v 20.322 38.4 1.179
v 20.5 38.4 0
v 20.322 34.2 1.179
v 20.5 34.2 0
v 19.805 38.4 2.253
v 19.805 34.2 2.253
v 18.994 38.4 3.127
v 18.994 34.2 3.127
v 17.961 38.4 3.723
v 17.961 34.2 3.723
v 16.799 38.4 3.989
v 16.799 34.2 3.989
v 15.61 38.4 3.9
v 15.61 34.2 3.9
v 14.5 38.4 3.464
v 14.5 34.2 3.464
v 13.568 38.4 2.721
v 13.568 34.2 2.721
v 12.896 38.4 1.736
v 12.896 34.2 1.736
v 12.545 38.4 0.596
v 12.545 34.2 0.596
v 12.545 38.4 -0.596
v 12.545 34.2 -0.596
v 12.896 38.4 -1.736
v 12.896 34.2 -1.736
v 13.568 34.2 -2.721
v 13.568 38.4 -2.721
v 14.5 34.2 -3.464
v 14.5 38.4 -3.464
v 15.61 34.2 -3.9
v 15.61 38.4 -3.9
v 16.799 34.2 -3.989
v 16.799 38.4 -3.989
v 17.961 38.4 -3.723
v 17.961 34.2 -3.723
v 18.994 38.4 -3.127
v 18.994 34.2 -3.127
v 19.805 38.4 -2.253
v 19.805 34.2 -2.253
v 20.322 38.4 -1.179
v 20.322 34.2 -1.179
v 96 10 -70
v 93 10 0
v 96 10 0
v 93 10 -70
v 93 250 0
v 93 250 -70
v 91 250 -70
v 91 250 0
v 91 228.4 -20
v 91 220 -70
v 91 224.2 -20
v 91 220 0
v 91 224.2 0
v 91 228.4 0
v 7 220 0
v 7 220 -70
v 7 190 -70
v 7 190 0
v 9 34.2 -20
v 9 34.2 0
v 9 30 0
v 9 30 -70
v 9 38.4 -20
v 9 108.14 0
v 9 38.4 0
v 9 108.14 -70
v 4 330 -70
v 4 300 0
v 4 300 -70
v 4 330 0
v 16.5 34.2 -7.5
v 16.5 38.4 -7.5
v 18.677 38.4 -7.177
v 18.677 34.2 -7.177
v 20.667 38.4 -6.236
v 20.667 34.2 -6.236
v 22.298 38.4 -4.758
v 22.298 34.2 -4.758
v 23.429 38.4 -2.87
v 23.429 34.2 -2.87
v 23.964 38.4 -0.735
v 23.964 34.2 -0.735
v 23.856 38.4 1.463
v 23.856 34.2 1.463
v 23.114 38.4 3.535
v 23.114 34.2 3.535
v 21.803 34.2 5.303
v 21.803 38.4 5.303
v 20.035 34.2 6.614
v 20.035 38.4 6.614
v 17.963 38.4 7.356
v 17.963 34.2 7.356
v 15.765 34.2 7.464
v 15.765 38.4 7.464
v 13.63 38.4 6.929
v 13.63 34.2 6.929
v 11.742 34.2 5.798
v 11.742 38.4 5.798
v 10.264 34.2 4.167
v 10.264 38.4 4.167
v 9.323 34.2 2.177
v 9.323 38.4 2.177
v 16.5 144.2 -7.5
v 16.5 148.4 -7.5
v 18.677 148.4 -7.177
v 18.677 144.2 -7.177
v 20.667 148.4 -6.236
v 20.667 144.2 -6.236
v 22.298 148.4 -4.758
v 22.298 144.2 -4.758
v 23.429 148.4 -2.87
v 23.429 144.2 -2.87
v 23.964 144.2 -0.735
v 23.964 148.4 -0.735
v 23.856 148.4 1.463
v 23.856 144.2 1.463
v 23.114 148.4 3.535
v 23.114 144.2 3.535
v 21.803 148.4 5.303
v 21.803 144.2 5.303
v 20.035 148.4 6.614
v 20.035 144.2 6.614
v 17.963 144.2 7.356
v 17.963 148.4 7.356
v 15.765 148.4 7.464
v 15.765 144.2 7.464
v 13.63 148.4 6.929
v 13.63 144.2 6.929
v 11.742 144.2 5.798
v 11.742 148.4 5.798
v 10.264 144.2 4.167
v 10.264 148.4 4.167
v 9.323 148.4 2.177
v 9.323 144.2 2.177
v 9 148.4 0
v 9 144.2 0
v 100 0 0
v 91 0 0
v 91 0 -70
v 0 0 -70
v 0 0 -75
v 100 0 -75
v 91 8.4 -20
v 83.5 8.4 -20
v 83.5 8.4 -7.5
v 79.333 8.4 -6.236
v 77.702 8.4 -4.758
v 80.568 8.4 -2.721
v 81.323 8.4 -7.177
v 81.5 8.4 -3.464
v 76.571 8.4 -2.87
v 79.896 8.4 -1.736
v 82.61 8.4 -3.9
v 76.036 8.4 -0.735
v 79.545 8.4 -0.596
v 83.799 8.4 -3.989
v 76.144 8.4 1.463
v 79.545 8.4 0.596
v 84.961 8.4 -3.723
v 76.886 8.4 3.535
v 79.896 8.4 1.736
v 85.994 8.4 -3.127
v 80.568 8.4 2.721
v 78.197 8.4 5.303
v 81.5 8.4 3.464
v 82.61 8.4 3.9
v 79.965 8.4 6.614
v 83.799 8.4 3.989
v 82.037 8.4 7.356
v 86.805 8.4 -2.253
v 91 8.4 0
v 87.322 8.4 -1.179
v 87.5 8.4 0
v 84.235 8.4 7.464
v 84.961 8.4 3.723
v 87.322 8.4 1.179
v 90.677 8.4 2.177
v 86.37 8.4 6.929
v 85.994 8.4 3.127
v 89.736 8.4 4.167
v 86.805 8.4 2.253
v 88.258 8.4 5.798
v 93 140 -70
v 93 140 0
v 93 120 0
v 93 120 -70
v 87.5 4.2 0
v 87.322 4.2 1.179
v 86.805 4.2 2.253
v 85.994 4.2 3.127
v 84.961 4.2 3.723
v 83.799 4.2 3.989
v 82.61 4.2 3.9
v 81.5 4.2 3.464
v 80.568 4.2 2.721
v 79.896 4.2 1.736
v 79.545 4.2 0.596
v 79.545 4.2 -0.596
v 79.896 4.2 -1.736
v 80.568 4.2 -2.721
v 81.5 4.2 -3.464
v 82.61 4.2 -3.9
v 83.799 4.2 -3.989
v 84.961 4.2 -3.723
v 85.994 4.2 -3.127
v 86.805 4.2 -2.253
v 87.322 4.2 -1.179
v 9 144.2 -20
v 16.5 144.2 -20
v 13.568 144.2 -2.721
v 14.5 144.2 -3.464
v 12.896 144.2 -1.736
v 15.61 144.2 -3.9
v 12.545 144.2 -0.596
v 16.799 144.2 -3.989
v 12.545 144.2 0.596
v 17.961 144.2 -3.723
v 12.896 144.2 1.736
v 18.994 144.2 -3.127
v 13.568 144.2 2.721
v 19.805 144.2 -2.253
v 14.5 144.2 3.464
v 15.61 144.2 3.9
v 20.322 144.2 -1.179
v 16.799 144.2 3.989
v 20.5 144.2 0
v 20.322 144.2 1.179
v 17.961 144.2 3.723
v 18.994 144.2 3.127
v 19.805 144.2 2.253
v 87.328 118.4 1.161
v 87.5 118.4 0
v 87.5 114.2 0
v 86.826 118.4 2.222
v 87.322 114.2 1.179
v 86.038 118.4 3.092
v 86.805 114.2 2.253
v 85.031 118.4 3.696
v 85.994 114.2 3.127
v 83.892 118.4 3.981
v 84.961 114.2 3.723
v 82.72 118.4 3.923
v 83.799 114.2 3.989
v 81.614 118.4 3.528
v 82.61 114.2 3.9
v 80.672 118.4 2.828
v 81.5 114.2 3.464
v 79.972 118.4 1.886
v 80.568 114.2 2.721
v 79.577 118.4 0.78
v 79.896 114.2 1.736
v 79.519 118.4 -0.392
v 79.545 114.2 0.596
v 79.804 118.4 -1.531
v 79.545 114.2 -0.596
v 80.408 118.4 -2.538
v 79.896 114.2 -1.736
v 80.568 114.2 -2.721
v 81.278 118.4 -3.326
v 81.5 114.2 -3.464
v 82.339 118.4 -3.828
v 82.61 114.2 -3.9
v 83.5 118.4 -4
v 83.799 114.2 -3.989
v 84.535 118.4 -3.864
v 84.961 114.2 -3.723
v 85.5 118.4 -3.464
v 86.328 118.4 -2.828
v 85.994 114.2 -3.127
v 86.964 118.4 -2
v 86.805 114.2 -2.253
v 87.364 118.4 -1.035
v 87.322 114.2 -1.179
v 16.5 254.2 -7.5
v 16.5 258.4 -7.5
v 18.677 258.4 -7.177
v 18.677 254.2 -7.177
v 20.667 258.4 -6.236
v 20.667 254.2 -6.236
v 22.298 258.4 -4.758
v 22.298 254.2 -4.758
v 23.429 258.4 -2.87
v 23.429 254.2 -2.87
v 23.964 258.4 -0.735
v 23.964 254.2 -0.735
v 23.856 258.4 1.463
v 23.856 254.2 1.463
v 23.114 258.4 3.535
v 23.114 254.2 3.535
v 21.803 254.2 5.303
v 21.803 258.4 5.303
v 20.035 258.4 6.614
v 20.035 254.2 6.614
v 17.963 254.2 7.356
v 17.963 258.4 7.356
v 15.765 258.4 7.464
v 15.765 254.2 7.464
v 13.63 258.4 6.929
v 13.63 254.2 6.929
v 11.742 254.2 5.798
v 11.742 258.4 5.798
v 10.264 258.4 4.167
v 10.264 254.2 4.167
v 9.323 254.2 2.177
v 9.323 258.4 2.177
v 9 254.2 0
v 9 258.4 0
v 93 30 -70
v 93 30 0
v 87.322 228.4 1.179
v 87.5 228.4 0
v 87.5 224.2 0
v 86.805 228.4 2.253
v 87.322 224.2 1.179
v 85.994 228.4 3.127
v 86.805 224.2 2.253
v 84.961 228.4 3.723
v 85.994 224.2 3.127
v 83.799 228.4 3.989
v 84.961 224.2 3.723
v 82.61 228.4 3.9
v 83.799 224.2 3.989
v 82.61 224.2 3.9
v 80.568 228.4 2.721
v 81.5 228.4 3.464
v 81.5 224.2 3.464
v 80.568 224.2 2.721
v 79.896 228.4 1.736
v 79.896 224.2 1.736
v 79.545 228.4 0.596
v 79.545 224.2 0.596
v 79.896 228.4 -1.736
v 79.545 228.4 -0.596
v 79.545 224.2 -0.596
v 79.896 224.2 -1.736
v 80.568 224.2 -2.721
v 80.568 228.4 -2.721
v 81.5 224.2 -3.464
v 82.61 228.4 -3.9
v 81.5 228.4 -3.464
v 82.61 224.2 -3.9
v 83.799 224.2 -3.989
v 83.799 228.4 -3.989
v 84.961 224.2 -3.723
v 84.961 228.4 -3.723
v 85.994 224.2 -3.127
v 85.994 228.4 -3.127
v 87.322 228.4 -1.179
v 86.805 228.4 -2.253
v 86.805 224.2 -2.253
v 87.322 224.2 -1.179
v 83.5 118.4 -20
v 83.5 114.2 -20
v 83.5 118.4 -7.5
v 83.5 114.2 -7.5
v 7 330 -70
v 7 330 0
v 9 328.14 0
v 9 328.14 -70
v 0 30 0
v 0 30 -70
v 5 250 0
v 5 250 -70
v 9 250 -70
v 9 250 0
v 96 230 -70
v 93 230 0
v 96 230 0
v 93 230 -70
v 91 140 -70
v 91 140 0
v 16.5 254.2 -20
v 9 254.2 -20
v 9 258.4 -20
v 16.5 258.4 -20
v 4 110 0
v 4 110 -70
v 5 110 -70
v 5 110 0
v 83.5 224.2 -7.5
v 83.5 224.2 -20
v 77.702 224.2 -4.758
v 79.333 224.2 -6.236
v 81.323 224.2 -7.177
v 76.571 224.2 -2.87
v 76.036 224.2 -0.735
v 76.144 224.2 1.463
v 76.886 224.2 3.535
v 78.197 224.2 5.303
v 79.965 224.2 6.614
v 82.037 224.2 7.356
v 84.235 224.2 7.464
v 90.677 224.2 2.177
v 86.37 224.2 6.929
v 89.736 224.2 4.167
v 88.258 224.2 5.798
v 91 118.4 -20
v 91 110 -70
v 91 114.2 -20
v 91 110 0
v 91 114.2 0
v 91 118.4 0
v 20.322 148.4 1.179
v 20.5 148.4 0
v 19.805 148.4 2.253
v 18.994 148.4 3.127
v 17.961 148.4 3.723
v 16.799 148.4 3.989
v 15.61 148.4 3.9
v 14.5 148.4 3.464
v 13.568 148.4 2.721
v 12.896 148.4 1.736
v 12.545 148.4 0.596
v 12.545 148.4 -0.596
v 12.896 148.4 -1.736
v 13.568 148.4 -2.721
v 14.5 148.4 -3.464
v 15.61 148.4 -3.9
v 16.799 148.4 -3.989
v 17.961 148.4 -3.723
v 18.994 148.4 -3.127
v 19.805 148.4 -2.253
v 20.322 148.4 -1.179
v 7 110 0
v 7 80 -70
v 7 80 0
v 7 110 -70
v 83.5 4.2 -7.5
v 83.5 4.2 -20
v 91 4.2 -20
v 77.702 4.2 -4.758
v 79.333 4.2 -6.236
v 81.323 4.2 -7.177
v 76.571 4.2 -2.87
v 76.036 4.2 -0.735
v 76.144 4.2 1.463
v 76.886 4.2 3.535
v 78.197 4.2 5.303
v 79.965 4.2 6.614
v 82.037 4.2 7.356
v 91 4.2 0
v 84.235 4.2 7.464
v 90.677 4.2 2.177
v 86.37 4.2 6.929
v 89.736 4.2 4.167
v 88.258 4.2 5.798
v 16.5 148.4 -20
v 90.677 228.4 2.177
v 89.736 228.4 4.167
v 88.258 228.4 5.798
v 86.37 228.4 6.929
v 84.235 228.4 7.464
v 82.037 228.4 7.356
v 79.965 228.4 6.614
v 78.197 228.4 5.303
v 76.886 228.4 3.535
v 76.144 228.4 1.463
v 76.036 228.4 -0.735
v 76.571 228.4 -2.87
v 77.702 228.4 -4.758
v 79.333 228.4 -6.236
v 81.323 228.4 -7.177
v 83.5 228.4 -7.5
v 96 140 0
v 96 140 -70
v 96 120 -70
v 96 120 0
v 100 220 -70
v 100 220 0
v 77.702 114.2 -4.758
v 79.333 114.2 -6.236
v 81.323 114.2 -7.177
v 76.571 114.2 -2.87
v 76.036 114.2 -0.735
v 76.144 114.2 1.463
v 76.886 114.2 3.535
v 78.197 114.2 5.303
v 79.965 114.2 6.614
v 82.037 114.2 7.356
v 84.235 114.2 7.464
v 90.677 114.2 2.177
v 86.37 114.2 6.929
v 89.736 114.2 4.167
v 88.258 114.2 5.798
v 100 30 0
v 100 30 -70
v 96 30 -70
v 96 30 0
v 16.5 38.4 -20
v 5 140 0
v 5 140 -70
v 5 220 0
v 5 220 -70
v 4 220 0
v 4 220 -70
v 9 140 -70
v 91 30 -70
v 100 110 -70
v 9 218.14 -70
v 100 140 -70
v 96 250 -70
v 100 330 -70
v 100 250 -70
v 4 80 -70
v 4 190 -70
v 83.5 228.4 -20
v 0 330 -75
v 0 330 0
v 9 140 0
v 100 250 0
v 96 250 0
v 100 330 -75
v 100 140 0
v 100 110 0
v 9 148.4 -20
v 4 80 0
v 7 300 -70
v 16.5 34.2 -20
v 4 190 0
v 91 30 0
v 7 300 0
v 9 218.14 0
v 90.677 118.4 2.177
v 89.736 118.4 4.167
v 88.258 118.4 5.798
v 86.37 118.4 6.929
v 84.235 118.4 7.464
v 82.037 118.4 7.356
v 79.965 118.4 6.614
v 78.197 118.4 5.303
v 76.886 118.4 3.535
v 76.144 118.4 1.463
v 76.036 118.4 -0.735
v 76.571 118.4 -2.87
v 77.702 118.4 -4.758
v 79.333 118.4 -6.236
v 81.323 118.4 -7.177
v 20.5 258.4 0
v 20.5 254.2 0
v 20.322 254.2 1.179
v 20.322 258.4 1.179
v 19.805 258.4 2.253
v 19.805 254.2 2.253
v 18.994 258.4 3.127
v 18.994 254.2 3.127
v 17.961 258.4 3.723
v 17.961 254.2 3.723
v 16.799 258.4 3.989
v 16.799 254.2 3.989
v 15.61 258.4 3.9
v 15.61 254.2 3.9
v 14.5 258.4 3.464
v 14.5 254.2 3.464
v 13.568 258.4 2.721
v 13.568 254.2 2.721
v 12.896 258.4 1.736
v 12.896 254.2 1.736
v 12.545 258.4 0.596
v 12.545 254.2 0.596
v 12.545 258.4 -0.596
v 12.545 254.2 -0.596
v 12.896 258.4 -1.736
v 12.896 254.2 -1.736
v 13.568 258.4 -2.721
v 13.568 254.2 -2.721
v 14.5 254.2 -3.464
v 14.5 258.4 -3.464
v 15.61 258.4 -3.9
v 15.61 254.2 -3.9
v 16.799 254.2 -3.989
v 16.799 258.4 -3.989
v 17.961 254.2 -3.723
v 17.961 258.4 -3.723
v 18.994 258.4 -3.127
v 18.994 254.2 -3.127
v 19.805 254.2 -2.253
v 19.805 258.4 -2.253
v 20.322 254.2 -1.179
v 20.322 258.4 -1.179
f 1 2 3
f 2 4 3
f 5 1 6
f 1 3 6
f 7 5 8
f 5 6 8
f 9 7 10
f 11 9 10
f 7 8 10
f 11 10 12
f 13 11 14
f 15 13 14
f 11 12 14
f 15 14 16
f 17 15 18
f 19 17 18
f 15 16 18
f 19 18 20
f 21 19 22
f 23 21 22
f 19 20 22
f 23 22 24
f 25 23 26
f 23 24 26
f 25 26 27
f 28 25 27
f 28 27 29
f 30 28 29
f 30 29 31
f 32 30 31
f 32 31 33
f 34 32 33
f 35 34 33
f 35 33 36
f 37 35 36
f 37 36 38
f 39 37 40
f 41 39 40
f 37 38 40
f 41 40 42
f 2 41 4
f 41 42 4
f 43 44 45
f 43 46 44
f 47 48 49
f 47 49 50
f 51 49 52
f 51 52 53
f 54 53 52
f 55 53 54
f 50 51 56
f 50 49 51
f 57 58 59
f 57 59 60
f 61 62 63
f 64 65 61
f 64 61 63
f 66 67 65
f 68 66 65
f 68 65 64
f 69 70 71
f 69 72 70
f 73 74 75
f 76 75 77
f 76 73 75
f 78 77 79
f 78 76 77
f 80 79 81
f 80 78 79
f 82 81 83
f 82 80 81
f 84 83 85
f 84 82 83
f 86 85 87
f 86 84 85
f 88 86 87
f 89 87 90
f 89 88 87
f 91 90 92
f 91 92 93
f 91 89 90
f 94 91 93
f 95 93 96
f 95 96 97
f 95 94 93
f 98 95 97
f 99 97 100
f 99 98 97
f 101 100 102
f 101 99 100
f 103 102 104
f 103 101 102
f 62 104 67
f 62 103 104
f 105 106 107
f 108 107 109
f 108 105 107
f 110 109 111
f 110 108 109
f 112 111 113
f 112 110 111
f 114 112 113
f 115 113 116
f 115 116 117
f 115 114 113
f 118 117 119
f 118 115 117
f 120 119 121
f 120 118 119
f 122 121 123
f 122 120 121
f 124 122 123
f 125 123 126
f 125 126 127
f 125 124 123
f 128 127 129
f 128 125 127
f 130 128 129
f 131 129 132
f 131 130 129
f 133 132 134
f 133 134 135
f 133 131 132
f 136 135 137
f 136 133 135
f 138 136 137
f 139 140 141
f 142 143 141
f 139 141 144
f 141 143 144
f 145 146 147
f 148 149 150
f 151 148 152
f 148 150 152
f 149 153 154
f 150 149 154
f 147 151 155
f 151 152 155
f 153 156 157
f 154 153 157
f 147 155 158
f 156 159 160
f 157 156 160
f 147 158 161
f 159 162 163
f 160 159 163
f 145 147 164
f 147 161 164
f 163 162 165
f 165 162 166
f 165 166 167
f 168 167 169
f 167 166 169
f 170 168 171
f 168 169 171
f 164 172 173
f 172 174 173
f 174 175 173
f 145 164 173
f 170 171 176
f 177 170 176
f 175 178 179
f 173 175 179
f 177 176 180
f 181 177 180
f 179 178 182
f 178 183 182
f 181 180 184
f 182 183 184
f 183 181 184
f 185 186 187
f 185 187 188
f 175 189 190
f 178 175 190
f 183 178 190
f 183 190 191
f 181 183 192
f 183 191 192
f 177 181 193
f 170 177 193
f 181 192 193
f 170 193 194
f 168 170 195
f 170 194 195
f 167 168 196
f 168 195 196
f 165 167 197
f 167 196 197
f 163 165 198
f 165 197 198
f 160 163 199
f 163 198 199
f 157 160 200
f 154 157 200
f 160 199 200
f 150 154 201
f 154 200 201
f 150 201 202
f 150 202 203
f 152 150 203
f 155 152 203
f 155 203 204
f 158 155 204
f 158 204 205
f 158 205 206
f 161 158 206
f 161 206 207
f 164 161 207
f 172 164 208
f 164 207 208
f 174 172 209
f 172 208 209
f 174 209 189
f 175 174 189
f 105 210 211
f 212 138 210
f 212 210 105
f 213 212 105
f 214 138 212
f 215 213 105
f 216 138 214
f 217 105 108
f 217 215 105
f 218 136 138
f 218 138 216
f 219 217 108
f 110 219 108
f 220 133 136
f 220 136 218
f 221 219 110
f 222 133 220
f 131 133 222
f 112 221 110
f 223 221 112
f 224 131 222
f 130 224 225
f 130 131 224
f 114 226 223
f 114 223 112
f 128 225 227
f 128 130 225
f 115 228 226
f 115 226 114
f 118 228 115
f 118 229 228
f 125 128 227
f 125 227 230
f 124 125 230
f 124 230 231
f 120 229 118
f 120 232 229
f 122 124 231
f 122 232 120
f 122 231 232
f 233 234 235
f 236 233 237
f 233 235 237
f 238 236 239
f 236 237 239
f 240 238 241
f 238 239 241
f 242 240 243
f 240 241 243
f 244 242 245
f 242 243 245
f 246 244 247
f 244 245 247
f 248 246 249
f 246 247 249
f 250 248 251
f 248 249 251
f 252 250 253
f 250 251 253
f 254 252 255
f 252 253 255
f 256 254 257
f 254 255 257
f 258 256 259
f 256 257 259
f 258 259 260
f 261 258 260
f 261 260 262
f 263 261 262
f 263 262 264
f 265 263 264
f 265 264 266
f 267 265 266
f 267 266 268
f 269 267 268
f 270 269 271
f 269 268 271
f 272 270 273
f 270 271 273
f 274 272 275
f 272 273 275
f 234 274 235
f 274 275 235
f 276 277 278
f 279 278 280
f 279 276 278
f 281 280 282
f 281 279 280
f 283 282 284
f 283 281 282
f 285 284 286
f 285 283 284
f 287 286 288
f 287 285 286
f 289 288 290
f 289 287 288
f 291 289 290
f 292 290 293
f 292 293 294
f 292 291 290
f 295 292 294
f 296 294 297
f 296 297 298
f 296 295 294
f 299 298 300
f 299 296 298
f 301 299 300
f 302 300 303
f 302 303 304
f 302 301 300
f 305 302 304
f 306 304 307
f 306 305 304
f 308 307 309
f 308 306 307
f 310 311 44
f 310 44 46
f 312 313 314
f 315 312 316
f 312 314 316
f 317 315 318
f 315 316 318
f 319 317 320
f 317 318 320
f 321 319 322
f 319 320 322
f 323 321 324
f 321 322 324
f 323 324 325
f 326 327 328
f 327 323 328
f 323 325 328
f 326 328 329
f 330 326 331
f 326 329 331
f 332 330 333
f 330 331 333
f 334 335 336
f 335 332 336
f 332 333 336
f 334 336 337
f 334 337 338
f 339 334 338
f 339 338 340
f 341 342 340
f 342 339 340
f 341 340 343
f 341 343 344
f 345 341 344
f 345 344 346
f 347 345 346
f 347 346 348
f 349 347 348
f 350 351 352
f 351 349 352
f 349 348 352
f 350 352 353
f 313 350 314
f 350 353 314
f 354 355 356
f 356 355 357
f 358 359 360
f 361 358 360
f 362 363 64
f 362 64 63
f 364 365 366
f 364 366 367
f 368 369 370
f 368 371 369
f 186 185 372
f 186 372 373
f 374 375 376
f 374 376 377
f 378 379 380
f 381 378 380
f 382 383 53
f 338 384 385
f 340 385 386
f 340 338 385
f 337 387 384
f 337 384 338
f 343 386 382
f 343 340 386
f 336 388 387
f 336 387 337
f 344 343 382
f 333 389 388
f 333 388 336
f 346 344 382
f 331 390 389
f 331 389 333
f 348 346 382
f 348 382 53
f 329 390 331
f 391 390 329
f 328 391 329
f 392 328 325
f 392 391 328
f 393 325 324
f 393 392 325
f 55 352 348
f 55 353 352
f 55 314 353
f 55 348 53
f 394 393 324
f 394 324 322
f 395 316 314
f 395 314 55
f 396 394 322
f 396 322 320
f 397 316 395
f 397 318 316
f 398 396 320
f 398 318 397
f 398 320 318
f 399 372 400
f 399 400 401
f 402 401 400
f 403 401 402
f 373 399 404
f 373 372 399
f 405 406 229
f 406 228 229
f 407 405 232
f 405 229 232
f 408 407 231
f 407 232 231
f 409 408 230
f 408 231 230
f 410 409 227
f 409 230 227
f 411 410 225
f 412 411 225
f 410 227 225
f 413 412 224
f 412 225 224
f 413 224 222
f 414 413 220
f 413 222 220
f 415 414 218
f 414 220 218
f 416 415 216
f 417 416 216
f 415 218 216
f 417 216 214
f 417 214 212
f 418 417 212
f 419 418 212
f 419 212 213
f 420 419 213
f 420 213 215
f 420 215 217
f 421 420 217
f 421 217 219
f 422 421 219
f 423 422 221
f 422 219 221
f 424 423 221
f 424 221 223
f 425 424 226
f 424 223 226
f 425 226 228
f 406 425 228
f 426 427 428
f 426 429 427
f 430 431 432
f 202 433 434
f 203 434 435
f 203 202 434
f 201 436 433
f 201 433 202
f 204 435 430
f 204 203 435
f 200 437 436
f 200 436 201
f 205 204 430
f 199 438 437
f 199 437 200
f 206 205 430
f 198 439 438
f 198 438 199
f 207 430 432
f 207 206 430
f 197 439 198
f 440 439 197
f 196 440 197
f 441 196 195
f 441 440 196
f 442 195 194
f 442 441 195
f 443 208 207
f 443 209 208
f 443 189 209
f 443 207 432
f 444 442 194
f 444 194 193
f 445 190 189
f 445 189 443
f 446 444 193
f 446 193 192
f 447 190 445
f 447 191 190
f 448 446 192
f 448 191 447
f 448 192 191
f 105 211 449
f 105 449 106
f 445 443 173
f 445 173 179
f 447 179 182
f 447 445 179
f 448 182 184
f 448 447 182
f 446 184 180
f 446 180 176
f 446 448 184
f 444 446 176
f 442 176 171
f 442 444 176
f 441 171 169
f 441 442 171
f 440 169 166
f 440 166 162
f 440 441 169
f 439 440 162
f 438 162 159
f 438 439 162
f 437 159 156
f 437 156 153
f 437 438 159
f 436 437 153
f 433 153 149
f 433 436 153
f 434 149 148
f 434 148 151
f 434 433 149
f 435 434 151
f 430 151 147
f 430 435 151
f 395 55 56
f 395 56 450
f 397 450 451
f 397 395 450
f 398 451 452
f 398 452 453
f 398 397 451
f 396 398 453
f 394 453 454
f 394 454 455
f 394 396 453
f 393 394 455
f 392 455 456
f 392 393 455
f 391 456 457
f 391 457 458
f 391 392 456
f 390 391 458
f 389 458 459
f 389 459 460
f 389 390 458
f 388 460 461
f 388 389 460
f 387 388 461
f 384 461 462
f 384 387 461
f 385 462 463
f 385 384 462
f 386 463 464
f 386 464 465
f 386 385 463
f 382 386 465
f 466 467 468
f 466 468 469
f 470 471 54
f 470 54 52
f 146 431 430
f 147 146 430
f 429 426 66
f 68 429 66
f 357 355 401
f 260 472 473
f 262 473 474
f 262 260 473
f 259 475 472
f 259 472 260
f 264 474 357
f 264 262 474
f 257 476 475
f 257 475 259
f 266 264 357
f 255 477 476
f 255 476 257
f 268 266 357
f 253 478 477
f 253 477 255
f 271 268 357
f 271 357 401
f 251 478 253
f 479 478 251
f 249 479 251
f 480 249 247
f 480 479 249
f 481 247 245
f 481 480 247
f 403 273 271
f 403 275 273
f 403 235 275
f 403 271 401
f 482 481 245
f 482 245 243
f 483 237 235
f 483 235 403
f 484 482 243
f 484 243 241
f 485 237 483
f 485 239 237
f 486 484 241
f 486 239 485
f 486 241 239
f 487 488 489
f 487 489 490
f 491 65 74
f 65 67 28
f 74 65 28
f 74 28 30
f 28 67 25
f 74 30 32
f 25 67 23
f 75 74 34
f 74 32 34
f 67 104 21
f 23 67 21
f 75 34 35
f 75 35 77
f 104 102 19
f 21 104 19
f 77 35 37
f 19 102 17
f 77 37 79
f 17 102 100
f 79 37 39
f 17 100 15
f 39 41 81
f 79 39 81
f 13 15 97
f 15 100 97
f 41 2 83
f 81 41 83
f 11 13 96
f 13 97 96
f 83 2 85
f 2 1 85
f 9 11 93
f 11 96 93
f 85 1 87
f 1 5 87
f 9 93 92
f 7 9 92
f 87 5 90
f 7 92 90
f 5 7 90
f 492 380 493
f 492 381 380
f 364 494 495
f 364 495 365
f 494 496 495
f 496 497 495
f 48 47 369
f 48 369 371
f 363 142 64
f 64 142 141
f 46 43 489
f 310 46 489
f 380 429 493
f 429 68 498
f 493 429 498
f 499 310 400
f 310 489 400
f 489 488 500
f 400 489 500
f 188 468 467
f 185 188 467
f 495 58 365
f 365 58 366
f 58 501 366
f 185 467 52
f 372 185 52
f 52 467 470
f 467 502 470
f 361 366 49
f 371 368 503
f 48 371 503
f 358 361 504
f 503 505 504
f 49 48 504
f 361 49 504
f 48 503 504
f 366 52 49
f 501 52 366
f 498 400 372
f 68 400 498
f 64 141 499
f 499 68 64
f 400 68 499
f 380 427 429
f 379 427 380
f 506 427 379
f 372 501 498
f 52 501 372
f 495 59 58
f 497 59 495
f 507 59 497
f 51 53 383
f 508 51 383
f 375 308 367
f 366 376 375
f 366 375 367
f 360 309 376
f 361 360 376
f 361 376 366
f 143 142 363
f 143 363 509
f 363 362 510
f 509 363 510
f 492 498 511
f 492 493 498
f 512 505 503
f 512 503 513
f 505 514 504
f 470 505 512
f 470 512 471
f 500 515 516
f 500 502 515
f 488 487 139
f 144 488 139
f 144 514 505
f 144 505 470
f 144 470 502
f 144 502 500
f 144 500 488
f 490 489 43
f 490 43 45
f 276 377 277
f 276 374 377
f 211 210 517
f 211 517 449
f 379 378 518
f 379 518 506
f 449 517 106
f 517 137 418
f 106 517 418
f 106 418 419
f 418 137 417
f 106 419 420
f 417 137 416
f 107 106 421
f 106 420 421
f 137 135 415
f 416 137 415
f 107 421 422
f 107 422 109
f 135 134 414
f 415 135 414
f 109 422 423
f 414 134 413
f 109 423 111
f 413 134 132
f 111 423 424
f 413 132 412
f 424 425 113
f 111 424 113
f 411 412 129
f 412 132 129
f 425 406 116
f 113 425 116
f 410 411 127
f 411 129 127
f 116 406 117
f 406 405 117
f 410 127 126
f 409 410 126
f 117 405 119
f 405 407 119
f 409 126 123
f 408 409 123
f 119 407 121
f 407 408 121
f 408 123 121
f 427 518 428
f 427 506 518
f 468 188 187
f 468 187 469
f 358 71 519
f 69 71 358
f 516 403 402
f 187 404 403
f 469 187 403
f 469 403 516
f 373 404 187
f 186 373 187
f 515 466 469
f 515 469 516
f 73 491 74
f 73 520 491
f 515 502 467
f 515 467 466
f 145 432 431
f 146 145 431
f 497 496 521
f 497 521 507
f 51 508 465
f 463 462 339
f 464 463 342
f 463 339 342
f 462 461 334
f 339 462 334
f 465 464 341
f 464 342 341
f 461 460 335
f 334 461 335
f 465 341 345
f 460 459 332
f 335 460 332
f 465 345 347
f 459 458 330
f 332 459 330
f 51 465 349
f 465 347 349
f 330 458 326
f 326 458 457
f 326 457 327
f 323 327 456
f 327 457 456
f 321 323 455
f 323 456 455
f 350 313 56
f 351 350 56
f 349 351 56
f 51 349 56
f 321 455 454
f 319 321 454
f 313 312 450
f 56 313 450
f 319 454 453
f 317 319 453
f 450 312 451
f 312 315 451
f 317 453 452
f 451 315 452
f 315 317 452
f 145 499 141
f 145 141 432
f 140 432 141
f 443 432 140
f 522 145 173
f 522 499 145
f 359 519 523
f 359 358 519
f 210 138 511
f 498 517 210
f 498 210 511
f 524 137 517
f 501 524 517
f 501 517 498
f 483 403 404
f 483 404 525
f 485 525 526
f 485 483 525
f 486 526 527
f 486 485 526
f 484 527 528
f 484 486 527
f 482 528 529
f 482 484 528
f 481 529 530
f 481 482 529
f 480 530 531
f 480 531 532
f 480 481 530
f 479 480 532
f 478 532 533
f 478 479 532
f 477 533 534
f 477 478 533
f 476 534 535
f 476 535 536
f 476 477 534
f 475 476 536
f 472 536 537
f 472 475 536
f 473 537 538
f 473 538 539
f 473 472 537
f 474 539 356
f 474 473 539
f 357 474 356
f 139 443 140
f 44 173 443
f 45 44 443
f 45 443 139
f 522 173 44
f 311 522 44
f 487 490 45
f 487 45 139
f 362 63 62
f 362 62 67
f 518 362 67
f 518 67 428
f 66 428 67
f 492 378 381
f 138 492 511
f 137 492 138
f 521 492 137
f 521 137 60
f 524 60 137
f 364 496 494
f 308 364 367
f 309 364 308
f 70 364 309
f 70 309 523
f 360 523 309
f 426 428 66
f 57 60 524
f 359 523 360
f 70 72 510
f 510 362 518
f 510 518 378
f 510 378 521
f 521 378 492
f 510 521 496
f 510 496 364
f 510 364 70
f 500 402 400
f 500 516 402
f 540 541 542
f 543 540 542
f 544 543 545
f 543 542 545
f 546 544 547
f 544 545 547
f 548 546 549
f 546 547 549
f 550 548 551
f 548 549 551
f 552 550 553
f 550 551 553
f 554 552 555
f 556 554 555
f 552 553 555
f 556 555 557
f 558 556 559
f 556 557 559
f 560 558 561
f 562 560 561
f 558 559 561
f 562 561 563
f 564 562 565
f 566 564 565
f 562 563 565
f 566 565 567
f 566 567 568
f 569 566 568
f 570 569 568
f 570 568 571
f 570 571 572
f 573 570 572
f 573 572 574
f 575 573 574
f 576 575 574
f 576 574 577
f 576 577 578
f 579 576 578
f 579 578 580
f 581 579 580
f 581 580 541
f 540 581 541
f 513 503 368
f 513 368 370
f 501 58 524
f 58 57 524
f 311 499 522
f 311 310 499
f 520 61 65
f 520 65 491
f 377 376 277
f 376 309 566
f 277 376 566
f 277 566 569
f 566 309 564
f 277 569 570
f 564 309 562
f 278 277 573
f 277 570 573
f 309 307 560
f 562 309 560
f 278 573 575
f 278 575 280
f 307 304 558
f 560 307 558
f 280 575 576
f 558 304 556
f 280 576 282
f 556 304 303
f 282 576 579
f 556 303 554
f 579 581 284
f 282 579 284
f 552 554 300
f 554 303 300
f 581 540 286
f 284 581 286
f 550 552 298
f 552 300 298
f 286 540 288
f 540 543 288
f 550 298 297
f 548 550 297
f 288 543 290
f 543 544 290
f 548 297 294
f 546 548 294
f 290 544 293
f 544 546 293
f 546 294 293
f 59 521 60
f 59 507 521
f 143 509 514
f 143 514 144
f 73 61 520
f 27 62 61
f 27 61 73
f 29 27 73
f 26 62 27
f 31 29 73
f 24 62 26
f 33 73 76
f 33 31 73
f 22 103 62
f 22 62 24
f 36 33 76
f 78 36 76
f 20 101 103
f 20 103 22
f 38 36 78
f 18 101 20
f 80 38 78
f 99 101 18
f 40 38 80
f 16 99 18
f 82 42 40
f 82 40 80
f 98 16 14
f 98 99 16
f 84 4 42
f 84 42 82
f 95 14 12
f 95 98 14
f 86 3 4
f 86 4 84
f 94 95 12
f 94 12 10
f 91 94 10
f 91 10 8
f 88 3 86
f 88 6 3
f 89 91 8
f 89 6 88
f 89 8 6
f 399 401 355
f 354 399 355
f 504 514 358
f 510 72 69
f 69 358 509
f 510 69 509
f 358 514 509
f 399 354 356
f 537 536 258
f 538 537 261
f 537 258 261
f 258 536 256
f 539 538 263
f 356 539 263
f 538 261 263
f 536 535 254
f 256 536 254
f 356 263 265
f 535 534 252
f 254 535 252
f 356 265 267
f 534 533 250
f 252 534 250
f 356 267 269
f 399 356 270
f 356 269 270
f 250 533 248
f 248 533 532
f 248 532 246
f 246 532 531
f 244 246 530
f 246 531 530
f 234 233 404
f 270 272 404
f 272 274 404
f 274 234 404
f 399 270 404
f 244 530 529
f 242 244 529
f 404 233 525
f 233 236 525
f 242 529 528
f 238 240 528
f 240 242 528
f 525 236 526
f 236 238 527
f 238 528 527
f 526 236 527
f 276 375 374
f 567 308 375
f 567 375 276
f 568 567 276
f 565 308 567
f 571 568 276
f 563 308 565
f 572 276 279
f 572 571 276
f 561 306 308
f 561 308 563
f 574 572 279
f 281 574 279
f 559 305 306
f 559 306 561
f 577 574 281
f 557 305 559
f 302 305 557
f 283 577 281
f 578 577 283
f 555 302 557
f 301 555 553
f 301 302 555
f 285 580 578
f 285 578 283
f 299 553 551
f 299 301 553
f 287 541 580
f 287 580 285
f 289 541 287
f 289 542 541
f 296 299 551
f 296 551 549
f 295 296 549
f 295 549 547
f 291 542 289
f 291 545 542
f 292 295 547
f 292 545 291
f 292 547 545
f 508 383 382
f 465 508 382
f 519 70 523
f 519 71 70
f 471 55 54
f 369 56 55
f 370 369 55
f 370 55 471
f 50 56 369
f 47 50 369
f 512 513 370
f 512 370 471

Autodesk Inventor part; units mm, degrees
sketch "Boceto1" plane through (0, 0, 0) normal (1, 0, 0) x (0, 1, 0)
  line L0 (0, 0) -> (330, 0)
  line L1 (330, 0) -> (330, -75)
  line L2 (330, -75) -> (0, -75)
  line L3 (0, -75) -> (0, 0)
  dimension "d0" = 330
  dimension "d1" = 75
extrude "Extrusión1" add sketch "Boceto1" along normal blind 5
sketch "Boceto2" plane through (5, 0, 0) normal (1, 0, 0) x (0, 0, -1)
  line L0 (75, 330) -> (0, 330) projected
  line L1 (75, 0) -> (75, 330) projected
  line L2 (0, 330) -> (75, 330)
  line L3 (75, 330) -> (75, 250)
  line L4 (75, 250) -> (0, 250)
  line L5 (0, 250) -> (0, 330)
  line L6 (75, 140) -> (0, 140)
  line L7 (0, 140) -> (0, 220)
  line L8 (0, 220) -> (75, 220)
  line L9 (75, 220) -> (75, 140)
  line L10 (75, 30) -> (0, 30)
  line L11 (0, 30) -> (0, 110)
  line L12 (0, 110) -> (75, 110)
  line L13 (75, 110) -> (75, 30)
  point P0 (0, 0)
  dimension "d4" = 80
  dimension "d7" = 110
extrude "Extrusión2" add sketch "Boceto2" along normal blind 4
sketch "Boceto3" plane through (0, 330, 0) normal (0, 1, 0) x (1, 0, 0)
  line L0 (7, 0) -> (4, 0)
  line L1 (4, 0) -> (4, 75)
  line L2 (4, 75) -> (7, 75)
  line L3 (7, 75) -> (7, 0)
  line L4 (0, 75) -> (0, 0) projected
  line L5 (9, 75) -> (9, 0) projected
  line L6 (0, 0) -> (9, 0) projected
  line L7 (0, 75) -> (9, 75) projected
  dimension "d14" = 4
  dimension "d15" = 2
  dimension "d16" = 0
  dimension "d17" = 0
  dimension "d62" = 3
sketch "Boceto8" plane through (5, 220, 0) normal (0, 1, 0) x (1, 0, 0)
  line L0 (-1, 0) -> (-1, 75) projected
  line L1 (2, 75) -> (2, 0) projected
  line L2 (-5, 0) -> (4, 0) projected
  line L3 (-5, 75) -> (4, 75) projected
sketch "Boceto9" plane through (5, 110, 0) normal (0, 1, 0) x (1, 0, 0)
  line L0 (2, 75) -> (2, 0) projected
  line L1 (-1, 0) -> (-1, 75) projected
  line L2 (-5, 0) -> (4, 0) projected
  line L3 (-5, 75) -> (4, 75) projected
extrude "Extrusión3" cut sketch "Boceto3" against normal blind 30 contours L0 L1 L2 L3
extrude "Extrusión4" cut sketch "Boceto8" against normal blind 30
extrude "Extrusión5" cut sketch "Boceto9" against normal blind 30
sketch "Boceto10" plane through (0, 0, 0) normal (-1, 0, 0) x (0, 0, 1)
  line L0 (-75, 0) -> (-75, 330) projected
  line L1 (-75, 330) -> (0, 330) projected
  line L2 (-75, 0) -> (-70, 0)
  line L3 (-70, 0) -> (-70, 330)
  line L4 (-70, 330) -> (-75, 330)
  line L5 (-75, 330) -> (-75, 0)
  point P0 (0, 0)
  dimension "d24" = 5
extrude "Extrusión6" add sketch "Boceto10" against normal blind 100
sketch "Boceto11" plane through (5, 0, -70) normal (0, 0, 1) x (1, 0, 0)
  line L0 (95, 330) -> (95, 0) projected
  line L1 (-5, 0) -> (95, 0) projected
  line L2 (95, 330) -> (90, 330)
  line L3 (90, 330) -> (90, 0)
  line L4 (90, 0) -> (95, 0)
  line L5 (95, 0) -> (95, 330)
  dimension "d27" = 5
extrude "Extrusión7" add sketch "Boceto11" along normal blind 70
sketch "Boceto12" plane through (95, 0, -70) normal (-1, 0, 0) x (0, 0, 1)
  line L0 (70, 0) -> (70, 330) projected
  line L1 (-5, 0) -> (-5, 330) projected
  line L2 (70, 250) -> (-5, 250)
  line L3 (-5, 250) -> (-5, 220)
  line L4 (-5, 220) -> (70, 220)
  line L5 (70, 220) -> (70, 250)
  line L6 (-5, 330) -> (70, 330) projected
  line L7 (70, 140) -> (-5, 140)
  line L8 (-5, 140) -> (-5, 110)
  line L9 (-5, 110) -> (70, 110)
  line L10 (70, 110) -> (70, 140)
  line L11 (70, 30) -> (-5, 30)
  line L12 (-5, 30) -> (-5, 0)
  line L13 (-5, 0) -> (70, 0)
  line L14 (70, 0) -> (70, 30)
  point P0 (70, 0)
  point P1 (70, 30)
  point P2 (-5, 30)
  point P3 (70, 140)
  point P4 (-5, 140)
  point P5 (-5, 250)
  dimension "d30" = 80
  dimension "d31" = 30
  dimension "d34" = 110
extrude "Extrusión8" add sketch "Boceto12" along normal blind 4 contours L13 L1 L11 L0 | L9 L1 L7 L0 | L4 L1 L2 L0
sketch "Boceto16" plane through (100, 0, 0) normal (1, 0, 0) x (0, 0, -1)
  line L0 (70, 250) -> (0, 250) projected
  line L1 (0, 330) -> (0, 250) projected
  line L2 (70, 330) -> (0, 330) projected
  line L3 (70, 250) -> (70, 330) projected
  line L4 (70, 140) -> (0, 140) projected
  line L5 (0, 220) -> (0, 140) projected
  line L6 (0, 220) -> (70, 220) projected
  line L7 (70, 140) -> (70, 220) projected
  line L8 (70, 30) -> (0, 30) projected
  line L9 (0, 110) -> (0, 30) projected
  line L10 (0, 110) -> (70, 110) projected
  line L11 (70, 30) -> (70, 110) projected
  point P0 (0, 0)
extrude "Extrusión12" cut sketch "Boceto16" against normal blind 10
sketch "Boceto25" plane through (0, 0, 0) normal (0, 0, 1) x (1, 0, 0)
  line L0 (7, 330) -> (7, 300) construction
  line L1 (7, 300) -> (7, 330) construction
  line L2 (7, 330) -> (125.2499, 220) construction
  line L3 (7, 330) -> (9, 328.1395)
  line L4 (9, 330) -> (9, 250) projected
  line L5 (7, 330) -> (9, 330) projected
  line L6 (8, 330) -> (7, 330)
  line L7 (7, 220) -> (9, 220) projected
  line L8 (7, 220) -> (9, 218.1395)
  line L9 (9, 220) -> (9, 140) projected
  line L10 (7, 220) -> (9.7315, 220) construction
  line L11 (9, 218.1395) -> (9, 220)
  line L12 (9, 220) -> (7, 220)
  line L13 (7, 110) -> (9, 110) projected
  line L14 (7, 110) -> (9, 108.1395)
  line L15 (9, 108.1395) -> (9, 110)
  line L16 (9, 110) -> (7, 110)
  point P0 (0, 0)
  dimension "d57" = 42.93
  dimension "d106" = 42.93
extrude "Extrusión13" cut sketch "Boceto25" against normal blind 70
sketch "Boceto26" plane through (5, 0, 0) normal (1, 0, 0) x (0, 0, -1)
  line L0 (70, 0) -> (70, 30) projected
  line L1 (70, 30) -> (0, 30) projected
  line L2 (0, 30) -> (0, 0) projected
  line L3 (0, 0) -> (70, 0) projected
extrude "Extrusión14" cut sketch "Boceto26" against normal blind 10
sketch "Boceto27" plane through (91, 220, -70) normal (0, -1, 0) x (1, 0, 0)
  line L0 (0, 0) -> (0, 70) construction
  line L1 (0, 70) -> (-37.4235, 70) construction
  circle A0 centre (-7.5, 70) radius 7.5
  line L2 (0, 50) -> (-7.5, 50)
  line L3 (-7.5, 50) -> (-7.5, 70)
  line L4 (-7.5, 70) -> (0, 70)
  line L5 (0, 70) -> (0, 50)
  circle A1 centre (-7.5, 70) radius 4
  point P0 (-91, 70)
  point P1 (-7.5, 62.5)
  dimension "d64" = 15
  dimension "d63" = 20
  dimension "d65" = 8
sketch "Boceto28" plane through (91, 110, -70) normal (0, -1, 0) x (1, 0, 0)
  line L0 (0, 50) -> (-7.5, 50) projected
  line L1 (-7.5, 50) -> (-7.5, 70) projected
  circle A0 centre (-7.5, 70) radius 7.5 projected
  circle A1 centre (-7.5, 70) radius 4 projected
  line L2 (0, 70) -> (-37.4235, 70) construction
  line L3 (0, 70) -> (0, 50) projected
  point P0 (-91, 70)
  point P1 (-7.5, 62.5)
sketch "Boceto29" plane through (0, 0, -75) normal (0, -1, 0) x (1, 0, 0)
  line L0 (91, 55) -> (83.5, 55) projected
  line L1 (83.5, 55) -> (83.5, 75) projected
  circle A0 centre (83.5, 75) radius 7.5 projected
  circle A1 centre (83.5, 75) radius 4 projected
  line L2 (83.5, 75) -> (91, 75) projected
  line L3 (91, 75) -> (91, 55) projected
  point P0 (0, 75)
  point P1 (83.5, 67.5)
extrude "Extrusión15" add sketch "Boceto27" against normal blind 8.4 contours L4 A1 L3 A0 | L5 L2 L3 A0 | A0 L3 A1 L4
extrude "Extrusión16" add sketch "Boceto28" against normal blind 8.4
extrude "Extrusión17" add sketch "Boceto29" against normal blind 8.4 contours L0 L1 A0 L3 | L2 A1 L1 A0 | A0 L1 A1 L2
sketch "Boceto30" plane through (91, 220, -70) normal (0, -1, 0) x (1, 0, 0)
  circle A0 centre (-7.5, 70) radius 4 projected
  line L0 (0, 0) -> (-91, 0) projected
  line L1 (-91, 0) -> (-91, -5) projected
  line L2 (-91, -5) -> (9, -5) projected
  line L3 (9, -5) -> (9, 70) projected
  line L4 (9, 70) -> (0, 70) projected
  arc A1 (0, 70) -> (-7.5, 62.5) centre (-7.5, 70) ccw projected
  line L5 (-7.5, 62.5) -> (-7.5, 50) projected
  line L6 (-7.5, 50) -> (0, 50) projected
  line L7 (0, 0) -> (0, 50) projected
  line L8 (0, 50) -> (0, 70)
  point P0 (-91, 70)
sketch "Boceto31" plane through (91, 110, -70) normal (0, -1, 0) x (1, 0, 0)
  line L0 (0, 50) -> (0, 70) projected
  circle A0 centre (-7.5, 70) radius 4 projected
  line L1 (9, 0) -> (0, 0) projected
  line L2 (9, 70) -> (9, 0) projected
  line L3 (0, 70) -> (9, 70) projected
  arc A1 (0, 70) -> (-7.5, 62.5) centre (-7.5, 70) ccw projected
  line L4 (-7.5, 62.5) -> (-7.5, 50) projected
  line L5 (-7.5, 50) -> (0, 50) projected
  line L6 (0, 0) -> (0, 50) projected
  point P0 (-91, 70)
sketch "Boceto32" plane through (0, 0, -75) normal (0, -1, 0) x (1, 0, 0)
  circle A0 centre (83.5, 75) radius 4 projected
  line L0 (100, 5) -> (91, 5) projected
  line L1 (100, 75) -> (100, 5) projected
  line L2 (91, 75) -> (100, 75) projected
  arc A1 (91, 75) -> (83.5, 67.5) centre (83.5, 75) ccw projected
  line L3 (83.5, 67.5) -> (83.5, 55) projected
  line L4 (83.5, 55) -> (91, 55) projected
  line L5 (91, 5) -> (91, 55) projected
  line L6 (91, 55) -> (91, 75) projected
  point P0 (0, 75)
extrude "Extrusión18" cut sketch "Boceto32" against normal blind 4.2 contours L4 L3 A1 L6
extrude "Extrusión19" cut sketch "Boceto31" against normal blind 4.2 contours L5 L4 A1 L0
extrude "Extrusión20" cut sketch "Boceto30" against normal blind 4.2 contours L6 L5 A1 L8
thread "Rosca1" size "M8x1.25" class "6H" standard "ANSI Metric M Profile" full length
ref_plane "Work Plane2" through (5, 254.2, 0) normal (0, -1, 0) x (1, 0, 0)
sketch "Sketch33" plane through (5, 254.2, 0) normal (0, -1, 0) x (1, 0, 0)
  line L0 (4, 0) -> (4, -20)
  line L1 (4, -20) -> (11.5, -20)
  line L2 (11.5, -20) -> (11.5, 0)
  line L3 (11.5, 0) -> (4, 0)
  circle A0 centre (11.5, 0) radius 4
  circle A1 centre (11.5, 0) radius 7.5
  point P0 (-5, 0)
  point P1 (4, 0)
  point P2 (11.5, -7.5)
  dimension "d81" = 20
  dimension "d82" = 7.5
  dimension "d83" = 20
  dimension "d84" = 8
  dimension "d85" = 15
extrude "Extrusion21" add sketch "Sketch33" against normal blind 4.2 contours A1 L2 L1 L0 | A1 L2 A0 L3 | L3 A0 L2 A1
ref_plane "Work Plane3" through (5, 144.2, 0) normal (0, -1, 0) x (1, 0, 0)
sketch "Sketch34" plane through (5, 144.2, 0) normal (0, -1, 0) x (1, 0, 0)
  line L0 (4, 0) -> (4, -20)
  line L1 (4, -20) -> (11.5, -20)
  line L2 (11.5, -20) -> (11.5, 0)
  line L3 (11.5, 0) -> (4, 0)
  circle A0 centre (11.5, 0) radius 4
  circle A1 centre (11.5, 0) radius 7.5
  point P0 (-5, 0)
  point P1 (11.5, -7.5)
  dimension "d89" = 20
  dimension "d90" = 7.5
  dimension "d91" = 20
  dimension "d92" = 8
  dimension "d93" = 15
extrude "Extrusion22" add sketch "Sketch34" against normal blind 4.2 contours A1 L2 L1 L0 | A1 L2 A0 L3 | L3 A0 L2 A1
ref_plane "Work Plane4" through (0, 34.2, 0) normal (0, -1, 0) x (1, 0, 0)
sketch "Sketch35" plane through (0, 34.2, 0) normal (0, -1, 0) x (1, 0, 0)
  line L0 (9, 0) -> (9, -20)
  line L1 (9, -20) -> (16.5, -20)
  line L2 (16.5, -20) -> (16.5, 0)
  line L3 (16.5, 0) -> (9, 0)
  circle A0 centre (16.5, 0) radius 4
  circle A1 centre (16.5, 0) radius 7.5
  point P0 (0, 0)
  point P1 (9, 0)
  point P2 (16.5, -7.5)
  dimension "d97" = 20
  dimension "d98" = 7.5
  dimension "d99" = 20
  dimension "d100" = 8
  dimension "d101" = 15
extrude "Extrusion23" add sketch "Sketch35" against normal blind 4.2 contours A1 L2 L1 L0 | A1 L2 A0 L3 | L3 A0 L2 A1
thread "Thread2" size "M8x1.25" class "6H" standard "ANSI Metric M Profile" full length
sketch "Boceto13" plane through (95, 250, 0) normal (0, 1, 0) x (1, 0, 0)
  line L0 (5, 70) -> (-4, 70) projected
  line L1 (-4, 0) -> (5, 0) projected
  line L2 (-2, 70) -> (1, 70)
  line L3 (1, 70) -> (1, 0)
  line L4 (1, 0) -> (-2, 0)
  line L5 (-2, 0) -> (-2, 70)
  line L6 (-4, 0) -> (-4, 70) projected
  point P0 (-2, 0)
  point P1 (1, 70)
  dimension "d113" = 2
  dimension "d114" = 3
extrude "Extrusión24" cut sketch "Boceto13" against normal blind 20 contours L3 L1 L5 L0
pattern_linear "Patrón rectangular1" count 3 spacing 110 along (0, -1, 0) of "Extrusión24"
equation "\"d57\" = d106"
properties part number "Interior Der" material "Plástico PBT"
